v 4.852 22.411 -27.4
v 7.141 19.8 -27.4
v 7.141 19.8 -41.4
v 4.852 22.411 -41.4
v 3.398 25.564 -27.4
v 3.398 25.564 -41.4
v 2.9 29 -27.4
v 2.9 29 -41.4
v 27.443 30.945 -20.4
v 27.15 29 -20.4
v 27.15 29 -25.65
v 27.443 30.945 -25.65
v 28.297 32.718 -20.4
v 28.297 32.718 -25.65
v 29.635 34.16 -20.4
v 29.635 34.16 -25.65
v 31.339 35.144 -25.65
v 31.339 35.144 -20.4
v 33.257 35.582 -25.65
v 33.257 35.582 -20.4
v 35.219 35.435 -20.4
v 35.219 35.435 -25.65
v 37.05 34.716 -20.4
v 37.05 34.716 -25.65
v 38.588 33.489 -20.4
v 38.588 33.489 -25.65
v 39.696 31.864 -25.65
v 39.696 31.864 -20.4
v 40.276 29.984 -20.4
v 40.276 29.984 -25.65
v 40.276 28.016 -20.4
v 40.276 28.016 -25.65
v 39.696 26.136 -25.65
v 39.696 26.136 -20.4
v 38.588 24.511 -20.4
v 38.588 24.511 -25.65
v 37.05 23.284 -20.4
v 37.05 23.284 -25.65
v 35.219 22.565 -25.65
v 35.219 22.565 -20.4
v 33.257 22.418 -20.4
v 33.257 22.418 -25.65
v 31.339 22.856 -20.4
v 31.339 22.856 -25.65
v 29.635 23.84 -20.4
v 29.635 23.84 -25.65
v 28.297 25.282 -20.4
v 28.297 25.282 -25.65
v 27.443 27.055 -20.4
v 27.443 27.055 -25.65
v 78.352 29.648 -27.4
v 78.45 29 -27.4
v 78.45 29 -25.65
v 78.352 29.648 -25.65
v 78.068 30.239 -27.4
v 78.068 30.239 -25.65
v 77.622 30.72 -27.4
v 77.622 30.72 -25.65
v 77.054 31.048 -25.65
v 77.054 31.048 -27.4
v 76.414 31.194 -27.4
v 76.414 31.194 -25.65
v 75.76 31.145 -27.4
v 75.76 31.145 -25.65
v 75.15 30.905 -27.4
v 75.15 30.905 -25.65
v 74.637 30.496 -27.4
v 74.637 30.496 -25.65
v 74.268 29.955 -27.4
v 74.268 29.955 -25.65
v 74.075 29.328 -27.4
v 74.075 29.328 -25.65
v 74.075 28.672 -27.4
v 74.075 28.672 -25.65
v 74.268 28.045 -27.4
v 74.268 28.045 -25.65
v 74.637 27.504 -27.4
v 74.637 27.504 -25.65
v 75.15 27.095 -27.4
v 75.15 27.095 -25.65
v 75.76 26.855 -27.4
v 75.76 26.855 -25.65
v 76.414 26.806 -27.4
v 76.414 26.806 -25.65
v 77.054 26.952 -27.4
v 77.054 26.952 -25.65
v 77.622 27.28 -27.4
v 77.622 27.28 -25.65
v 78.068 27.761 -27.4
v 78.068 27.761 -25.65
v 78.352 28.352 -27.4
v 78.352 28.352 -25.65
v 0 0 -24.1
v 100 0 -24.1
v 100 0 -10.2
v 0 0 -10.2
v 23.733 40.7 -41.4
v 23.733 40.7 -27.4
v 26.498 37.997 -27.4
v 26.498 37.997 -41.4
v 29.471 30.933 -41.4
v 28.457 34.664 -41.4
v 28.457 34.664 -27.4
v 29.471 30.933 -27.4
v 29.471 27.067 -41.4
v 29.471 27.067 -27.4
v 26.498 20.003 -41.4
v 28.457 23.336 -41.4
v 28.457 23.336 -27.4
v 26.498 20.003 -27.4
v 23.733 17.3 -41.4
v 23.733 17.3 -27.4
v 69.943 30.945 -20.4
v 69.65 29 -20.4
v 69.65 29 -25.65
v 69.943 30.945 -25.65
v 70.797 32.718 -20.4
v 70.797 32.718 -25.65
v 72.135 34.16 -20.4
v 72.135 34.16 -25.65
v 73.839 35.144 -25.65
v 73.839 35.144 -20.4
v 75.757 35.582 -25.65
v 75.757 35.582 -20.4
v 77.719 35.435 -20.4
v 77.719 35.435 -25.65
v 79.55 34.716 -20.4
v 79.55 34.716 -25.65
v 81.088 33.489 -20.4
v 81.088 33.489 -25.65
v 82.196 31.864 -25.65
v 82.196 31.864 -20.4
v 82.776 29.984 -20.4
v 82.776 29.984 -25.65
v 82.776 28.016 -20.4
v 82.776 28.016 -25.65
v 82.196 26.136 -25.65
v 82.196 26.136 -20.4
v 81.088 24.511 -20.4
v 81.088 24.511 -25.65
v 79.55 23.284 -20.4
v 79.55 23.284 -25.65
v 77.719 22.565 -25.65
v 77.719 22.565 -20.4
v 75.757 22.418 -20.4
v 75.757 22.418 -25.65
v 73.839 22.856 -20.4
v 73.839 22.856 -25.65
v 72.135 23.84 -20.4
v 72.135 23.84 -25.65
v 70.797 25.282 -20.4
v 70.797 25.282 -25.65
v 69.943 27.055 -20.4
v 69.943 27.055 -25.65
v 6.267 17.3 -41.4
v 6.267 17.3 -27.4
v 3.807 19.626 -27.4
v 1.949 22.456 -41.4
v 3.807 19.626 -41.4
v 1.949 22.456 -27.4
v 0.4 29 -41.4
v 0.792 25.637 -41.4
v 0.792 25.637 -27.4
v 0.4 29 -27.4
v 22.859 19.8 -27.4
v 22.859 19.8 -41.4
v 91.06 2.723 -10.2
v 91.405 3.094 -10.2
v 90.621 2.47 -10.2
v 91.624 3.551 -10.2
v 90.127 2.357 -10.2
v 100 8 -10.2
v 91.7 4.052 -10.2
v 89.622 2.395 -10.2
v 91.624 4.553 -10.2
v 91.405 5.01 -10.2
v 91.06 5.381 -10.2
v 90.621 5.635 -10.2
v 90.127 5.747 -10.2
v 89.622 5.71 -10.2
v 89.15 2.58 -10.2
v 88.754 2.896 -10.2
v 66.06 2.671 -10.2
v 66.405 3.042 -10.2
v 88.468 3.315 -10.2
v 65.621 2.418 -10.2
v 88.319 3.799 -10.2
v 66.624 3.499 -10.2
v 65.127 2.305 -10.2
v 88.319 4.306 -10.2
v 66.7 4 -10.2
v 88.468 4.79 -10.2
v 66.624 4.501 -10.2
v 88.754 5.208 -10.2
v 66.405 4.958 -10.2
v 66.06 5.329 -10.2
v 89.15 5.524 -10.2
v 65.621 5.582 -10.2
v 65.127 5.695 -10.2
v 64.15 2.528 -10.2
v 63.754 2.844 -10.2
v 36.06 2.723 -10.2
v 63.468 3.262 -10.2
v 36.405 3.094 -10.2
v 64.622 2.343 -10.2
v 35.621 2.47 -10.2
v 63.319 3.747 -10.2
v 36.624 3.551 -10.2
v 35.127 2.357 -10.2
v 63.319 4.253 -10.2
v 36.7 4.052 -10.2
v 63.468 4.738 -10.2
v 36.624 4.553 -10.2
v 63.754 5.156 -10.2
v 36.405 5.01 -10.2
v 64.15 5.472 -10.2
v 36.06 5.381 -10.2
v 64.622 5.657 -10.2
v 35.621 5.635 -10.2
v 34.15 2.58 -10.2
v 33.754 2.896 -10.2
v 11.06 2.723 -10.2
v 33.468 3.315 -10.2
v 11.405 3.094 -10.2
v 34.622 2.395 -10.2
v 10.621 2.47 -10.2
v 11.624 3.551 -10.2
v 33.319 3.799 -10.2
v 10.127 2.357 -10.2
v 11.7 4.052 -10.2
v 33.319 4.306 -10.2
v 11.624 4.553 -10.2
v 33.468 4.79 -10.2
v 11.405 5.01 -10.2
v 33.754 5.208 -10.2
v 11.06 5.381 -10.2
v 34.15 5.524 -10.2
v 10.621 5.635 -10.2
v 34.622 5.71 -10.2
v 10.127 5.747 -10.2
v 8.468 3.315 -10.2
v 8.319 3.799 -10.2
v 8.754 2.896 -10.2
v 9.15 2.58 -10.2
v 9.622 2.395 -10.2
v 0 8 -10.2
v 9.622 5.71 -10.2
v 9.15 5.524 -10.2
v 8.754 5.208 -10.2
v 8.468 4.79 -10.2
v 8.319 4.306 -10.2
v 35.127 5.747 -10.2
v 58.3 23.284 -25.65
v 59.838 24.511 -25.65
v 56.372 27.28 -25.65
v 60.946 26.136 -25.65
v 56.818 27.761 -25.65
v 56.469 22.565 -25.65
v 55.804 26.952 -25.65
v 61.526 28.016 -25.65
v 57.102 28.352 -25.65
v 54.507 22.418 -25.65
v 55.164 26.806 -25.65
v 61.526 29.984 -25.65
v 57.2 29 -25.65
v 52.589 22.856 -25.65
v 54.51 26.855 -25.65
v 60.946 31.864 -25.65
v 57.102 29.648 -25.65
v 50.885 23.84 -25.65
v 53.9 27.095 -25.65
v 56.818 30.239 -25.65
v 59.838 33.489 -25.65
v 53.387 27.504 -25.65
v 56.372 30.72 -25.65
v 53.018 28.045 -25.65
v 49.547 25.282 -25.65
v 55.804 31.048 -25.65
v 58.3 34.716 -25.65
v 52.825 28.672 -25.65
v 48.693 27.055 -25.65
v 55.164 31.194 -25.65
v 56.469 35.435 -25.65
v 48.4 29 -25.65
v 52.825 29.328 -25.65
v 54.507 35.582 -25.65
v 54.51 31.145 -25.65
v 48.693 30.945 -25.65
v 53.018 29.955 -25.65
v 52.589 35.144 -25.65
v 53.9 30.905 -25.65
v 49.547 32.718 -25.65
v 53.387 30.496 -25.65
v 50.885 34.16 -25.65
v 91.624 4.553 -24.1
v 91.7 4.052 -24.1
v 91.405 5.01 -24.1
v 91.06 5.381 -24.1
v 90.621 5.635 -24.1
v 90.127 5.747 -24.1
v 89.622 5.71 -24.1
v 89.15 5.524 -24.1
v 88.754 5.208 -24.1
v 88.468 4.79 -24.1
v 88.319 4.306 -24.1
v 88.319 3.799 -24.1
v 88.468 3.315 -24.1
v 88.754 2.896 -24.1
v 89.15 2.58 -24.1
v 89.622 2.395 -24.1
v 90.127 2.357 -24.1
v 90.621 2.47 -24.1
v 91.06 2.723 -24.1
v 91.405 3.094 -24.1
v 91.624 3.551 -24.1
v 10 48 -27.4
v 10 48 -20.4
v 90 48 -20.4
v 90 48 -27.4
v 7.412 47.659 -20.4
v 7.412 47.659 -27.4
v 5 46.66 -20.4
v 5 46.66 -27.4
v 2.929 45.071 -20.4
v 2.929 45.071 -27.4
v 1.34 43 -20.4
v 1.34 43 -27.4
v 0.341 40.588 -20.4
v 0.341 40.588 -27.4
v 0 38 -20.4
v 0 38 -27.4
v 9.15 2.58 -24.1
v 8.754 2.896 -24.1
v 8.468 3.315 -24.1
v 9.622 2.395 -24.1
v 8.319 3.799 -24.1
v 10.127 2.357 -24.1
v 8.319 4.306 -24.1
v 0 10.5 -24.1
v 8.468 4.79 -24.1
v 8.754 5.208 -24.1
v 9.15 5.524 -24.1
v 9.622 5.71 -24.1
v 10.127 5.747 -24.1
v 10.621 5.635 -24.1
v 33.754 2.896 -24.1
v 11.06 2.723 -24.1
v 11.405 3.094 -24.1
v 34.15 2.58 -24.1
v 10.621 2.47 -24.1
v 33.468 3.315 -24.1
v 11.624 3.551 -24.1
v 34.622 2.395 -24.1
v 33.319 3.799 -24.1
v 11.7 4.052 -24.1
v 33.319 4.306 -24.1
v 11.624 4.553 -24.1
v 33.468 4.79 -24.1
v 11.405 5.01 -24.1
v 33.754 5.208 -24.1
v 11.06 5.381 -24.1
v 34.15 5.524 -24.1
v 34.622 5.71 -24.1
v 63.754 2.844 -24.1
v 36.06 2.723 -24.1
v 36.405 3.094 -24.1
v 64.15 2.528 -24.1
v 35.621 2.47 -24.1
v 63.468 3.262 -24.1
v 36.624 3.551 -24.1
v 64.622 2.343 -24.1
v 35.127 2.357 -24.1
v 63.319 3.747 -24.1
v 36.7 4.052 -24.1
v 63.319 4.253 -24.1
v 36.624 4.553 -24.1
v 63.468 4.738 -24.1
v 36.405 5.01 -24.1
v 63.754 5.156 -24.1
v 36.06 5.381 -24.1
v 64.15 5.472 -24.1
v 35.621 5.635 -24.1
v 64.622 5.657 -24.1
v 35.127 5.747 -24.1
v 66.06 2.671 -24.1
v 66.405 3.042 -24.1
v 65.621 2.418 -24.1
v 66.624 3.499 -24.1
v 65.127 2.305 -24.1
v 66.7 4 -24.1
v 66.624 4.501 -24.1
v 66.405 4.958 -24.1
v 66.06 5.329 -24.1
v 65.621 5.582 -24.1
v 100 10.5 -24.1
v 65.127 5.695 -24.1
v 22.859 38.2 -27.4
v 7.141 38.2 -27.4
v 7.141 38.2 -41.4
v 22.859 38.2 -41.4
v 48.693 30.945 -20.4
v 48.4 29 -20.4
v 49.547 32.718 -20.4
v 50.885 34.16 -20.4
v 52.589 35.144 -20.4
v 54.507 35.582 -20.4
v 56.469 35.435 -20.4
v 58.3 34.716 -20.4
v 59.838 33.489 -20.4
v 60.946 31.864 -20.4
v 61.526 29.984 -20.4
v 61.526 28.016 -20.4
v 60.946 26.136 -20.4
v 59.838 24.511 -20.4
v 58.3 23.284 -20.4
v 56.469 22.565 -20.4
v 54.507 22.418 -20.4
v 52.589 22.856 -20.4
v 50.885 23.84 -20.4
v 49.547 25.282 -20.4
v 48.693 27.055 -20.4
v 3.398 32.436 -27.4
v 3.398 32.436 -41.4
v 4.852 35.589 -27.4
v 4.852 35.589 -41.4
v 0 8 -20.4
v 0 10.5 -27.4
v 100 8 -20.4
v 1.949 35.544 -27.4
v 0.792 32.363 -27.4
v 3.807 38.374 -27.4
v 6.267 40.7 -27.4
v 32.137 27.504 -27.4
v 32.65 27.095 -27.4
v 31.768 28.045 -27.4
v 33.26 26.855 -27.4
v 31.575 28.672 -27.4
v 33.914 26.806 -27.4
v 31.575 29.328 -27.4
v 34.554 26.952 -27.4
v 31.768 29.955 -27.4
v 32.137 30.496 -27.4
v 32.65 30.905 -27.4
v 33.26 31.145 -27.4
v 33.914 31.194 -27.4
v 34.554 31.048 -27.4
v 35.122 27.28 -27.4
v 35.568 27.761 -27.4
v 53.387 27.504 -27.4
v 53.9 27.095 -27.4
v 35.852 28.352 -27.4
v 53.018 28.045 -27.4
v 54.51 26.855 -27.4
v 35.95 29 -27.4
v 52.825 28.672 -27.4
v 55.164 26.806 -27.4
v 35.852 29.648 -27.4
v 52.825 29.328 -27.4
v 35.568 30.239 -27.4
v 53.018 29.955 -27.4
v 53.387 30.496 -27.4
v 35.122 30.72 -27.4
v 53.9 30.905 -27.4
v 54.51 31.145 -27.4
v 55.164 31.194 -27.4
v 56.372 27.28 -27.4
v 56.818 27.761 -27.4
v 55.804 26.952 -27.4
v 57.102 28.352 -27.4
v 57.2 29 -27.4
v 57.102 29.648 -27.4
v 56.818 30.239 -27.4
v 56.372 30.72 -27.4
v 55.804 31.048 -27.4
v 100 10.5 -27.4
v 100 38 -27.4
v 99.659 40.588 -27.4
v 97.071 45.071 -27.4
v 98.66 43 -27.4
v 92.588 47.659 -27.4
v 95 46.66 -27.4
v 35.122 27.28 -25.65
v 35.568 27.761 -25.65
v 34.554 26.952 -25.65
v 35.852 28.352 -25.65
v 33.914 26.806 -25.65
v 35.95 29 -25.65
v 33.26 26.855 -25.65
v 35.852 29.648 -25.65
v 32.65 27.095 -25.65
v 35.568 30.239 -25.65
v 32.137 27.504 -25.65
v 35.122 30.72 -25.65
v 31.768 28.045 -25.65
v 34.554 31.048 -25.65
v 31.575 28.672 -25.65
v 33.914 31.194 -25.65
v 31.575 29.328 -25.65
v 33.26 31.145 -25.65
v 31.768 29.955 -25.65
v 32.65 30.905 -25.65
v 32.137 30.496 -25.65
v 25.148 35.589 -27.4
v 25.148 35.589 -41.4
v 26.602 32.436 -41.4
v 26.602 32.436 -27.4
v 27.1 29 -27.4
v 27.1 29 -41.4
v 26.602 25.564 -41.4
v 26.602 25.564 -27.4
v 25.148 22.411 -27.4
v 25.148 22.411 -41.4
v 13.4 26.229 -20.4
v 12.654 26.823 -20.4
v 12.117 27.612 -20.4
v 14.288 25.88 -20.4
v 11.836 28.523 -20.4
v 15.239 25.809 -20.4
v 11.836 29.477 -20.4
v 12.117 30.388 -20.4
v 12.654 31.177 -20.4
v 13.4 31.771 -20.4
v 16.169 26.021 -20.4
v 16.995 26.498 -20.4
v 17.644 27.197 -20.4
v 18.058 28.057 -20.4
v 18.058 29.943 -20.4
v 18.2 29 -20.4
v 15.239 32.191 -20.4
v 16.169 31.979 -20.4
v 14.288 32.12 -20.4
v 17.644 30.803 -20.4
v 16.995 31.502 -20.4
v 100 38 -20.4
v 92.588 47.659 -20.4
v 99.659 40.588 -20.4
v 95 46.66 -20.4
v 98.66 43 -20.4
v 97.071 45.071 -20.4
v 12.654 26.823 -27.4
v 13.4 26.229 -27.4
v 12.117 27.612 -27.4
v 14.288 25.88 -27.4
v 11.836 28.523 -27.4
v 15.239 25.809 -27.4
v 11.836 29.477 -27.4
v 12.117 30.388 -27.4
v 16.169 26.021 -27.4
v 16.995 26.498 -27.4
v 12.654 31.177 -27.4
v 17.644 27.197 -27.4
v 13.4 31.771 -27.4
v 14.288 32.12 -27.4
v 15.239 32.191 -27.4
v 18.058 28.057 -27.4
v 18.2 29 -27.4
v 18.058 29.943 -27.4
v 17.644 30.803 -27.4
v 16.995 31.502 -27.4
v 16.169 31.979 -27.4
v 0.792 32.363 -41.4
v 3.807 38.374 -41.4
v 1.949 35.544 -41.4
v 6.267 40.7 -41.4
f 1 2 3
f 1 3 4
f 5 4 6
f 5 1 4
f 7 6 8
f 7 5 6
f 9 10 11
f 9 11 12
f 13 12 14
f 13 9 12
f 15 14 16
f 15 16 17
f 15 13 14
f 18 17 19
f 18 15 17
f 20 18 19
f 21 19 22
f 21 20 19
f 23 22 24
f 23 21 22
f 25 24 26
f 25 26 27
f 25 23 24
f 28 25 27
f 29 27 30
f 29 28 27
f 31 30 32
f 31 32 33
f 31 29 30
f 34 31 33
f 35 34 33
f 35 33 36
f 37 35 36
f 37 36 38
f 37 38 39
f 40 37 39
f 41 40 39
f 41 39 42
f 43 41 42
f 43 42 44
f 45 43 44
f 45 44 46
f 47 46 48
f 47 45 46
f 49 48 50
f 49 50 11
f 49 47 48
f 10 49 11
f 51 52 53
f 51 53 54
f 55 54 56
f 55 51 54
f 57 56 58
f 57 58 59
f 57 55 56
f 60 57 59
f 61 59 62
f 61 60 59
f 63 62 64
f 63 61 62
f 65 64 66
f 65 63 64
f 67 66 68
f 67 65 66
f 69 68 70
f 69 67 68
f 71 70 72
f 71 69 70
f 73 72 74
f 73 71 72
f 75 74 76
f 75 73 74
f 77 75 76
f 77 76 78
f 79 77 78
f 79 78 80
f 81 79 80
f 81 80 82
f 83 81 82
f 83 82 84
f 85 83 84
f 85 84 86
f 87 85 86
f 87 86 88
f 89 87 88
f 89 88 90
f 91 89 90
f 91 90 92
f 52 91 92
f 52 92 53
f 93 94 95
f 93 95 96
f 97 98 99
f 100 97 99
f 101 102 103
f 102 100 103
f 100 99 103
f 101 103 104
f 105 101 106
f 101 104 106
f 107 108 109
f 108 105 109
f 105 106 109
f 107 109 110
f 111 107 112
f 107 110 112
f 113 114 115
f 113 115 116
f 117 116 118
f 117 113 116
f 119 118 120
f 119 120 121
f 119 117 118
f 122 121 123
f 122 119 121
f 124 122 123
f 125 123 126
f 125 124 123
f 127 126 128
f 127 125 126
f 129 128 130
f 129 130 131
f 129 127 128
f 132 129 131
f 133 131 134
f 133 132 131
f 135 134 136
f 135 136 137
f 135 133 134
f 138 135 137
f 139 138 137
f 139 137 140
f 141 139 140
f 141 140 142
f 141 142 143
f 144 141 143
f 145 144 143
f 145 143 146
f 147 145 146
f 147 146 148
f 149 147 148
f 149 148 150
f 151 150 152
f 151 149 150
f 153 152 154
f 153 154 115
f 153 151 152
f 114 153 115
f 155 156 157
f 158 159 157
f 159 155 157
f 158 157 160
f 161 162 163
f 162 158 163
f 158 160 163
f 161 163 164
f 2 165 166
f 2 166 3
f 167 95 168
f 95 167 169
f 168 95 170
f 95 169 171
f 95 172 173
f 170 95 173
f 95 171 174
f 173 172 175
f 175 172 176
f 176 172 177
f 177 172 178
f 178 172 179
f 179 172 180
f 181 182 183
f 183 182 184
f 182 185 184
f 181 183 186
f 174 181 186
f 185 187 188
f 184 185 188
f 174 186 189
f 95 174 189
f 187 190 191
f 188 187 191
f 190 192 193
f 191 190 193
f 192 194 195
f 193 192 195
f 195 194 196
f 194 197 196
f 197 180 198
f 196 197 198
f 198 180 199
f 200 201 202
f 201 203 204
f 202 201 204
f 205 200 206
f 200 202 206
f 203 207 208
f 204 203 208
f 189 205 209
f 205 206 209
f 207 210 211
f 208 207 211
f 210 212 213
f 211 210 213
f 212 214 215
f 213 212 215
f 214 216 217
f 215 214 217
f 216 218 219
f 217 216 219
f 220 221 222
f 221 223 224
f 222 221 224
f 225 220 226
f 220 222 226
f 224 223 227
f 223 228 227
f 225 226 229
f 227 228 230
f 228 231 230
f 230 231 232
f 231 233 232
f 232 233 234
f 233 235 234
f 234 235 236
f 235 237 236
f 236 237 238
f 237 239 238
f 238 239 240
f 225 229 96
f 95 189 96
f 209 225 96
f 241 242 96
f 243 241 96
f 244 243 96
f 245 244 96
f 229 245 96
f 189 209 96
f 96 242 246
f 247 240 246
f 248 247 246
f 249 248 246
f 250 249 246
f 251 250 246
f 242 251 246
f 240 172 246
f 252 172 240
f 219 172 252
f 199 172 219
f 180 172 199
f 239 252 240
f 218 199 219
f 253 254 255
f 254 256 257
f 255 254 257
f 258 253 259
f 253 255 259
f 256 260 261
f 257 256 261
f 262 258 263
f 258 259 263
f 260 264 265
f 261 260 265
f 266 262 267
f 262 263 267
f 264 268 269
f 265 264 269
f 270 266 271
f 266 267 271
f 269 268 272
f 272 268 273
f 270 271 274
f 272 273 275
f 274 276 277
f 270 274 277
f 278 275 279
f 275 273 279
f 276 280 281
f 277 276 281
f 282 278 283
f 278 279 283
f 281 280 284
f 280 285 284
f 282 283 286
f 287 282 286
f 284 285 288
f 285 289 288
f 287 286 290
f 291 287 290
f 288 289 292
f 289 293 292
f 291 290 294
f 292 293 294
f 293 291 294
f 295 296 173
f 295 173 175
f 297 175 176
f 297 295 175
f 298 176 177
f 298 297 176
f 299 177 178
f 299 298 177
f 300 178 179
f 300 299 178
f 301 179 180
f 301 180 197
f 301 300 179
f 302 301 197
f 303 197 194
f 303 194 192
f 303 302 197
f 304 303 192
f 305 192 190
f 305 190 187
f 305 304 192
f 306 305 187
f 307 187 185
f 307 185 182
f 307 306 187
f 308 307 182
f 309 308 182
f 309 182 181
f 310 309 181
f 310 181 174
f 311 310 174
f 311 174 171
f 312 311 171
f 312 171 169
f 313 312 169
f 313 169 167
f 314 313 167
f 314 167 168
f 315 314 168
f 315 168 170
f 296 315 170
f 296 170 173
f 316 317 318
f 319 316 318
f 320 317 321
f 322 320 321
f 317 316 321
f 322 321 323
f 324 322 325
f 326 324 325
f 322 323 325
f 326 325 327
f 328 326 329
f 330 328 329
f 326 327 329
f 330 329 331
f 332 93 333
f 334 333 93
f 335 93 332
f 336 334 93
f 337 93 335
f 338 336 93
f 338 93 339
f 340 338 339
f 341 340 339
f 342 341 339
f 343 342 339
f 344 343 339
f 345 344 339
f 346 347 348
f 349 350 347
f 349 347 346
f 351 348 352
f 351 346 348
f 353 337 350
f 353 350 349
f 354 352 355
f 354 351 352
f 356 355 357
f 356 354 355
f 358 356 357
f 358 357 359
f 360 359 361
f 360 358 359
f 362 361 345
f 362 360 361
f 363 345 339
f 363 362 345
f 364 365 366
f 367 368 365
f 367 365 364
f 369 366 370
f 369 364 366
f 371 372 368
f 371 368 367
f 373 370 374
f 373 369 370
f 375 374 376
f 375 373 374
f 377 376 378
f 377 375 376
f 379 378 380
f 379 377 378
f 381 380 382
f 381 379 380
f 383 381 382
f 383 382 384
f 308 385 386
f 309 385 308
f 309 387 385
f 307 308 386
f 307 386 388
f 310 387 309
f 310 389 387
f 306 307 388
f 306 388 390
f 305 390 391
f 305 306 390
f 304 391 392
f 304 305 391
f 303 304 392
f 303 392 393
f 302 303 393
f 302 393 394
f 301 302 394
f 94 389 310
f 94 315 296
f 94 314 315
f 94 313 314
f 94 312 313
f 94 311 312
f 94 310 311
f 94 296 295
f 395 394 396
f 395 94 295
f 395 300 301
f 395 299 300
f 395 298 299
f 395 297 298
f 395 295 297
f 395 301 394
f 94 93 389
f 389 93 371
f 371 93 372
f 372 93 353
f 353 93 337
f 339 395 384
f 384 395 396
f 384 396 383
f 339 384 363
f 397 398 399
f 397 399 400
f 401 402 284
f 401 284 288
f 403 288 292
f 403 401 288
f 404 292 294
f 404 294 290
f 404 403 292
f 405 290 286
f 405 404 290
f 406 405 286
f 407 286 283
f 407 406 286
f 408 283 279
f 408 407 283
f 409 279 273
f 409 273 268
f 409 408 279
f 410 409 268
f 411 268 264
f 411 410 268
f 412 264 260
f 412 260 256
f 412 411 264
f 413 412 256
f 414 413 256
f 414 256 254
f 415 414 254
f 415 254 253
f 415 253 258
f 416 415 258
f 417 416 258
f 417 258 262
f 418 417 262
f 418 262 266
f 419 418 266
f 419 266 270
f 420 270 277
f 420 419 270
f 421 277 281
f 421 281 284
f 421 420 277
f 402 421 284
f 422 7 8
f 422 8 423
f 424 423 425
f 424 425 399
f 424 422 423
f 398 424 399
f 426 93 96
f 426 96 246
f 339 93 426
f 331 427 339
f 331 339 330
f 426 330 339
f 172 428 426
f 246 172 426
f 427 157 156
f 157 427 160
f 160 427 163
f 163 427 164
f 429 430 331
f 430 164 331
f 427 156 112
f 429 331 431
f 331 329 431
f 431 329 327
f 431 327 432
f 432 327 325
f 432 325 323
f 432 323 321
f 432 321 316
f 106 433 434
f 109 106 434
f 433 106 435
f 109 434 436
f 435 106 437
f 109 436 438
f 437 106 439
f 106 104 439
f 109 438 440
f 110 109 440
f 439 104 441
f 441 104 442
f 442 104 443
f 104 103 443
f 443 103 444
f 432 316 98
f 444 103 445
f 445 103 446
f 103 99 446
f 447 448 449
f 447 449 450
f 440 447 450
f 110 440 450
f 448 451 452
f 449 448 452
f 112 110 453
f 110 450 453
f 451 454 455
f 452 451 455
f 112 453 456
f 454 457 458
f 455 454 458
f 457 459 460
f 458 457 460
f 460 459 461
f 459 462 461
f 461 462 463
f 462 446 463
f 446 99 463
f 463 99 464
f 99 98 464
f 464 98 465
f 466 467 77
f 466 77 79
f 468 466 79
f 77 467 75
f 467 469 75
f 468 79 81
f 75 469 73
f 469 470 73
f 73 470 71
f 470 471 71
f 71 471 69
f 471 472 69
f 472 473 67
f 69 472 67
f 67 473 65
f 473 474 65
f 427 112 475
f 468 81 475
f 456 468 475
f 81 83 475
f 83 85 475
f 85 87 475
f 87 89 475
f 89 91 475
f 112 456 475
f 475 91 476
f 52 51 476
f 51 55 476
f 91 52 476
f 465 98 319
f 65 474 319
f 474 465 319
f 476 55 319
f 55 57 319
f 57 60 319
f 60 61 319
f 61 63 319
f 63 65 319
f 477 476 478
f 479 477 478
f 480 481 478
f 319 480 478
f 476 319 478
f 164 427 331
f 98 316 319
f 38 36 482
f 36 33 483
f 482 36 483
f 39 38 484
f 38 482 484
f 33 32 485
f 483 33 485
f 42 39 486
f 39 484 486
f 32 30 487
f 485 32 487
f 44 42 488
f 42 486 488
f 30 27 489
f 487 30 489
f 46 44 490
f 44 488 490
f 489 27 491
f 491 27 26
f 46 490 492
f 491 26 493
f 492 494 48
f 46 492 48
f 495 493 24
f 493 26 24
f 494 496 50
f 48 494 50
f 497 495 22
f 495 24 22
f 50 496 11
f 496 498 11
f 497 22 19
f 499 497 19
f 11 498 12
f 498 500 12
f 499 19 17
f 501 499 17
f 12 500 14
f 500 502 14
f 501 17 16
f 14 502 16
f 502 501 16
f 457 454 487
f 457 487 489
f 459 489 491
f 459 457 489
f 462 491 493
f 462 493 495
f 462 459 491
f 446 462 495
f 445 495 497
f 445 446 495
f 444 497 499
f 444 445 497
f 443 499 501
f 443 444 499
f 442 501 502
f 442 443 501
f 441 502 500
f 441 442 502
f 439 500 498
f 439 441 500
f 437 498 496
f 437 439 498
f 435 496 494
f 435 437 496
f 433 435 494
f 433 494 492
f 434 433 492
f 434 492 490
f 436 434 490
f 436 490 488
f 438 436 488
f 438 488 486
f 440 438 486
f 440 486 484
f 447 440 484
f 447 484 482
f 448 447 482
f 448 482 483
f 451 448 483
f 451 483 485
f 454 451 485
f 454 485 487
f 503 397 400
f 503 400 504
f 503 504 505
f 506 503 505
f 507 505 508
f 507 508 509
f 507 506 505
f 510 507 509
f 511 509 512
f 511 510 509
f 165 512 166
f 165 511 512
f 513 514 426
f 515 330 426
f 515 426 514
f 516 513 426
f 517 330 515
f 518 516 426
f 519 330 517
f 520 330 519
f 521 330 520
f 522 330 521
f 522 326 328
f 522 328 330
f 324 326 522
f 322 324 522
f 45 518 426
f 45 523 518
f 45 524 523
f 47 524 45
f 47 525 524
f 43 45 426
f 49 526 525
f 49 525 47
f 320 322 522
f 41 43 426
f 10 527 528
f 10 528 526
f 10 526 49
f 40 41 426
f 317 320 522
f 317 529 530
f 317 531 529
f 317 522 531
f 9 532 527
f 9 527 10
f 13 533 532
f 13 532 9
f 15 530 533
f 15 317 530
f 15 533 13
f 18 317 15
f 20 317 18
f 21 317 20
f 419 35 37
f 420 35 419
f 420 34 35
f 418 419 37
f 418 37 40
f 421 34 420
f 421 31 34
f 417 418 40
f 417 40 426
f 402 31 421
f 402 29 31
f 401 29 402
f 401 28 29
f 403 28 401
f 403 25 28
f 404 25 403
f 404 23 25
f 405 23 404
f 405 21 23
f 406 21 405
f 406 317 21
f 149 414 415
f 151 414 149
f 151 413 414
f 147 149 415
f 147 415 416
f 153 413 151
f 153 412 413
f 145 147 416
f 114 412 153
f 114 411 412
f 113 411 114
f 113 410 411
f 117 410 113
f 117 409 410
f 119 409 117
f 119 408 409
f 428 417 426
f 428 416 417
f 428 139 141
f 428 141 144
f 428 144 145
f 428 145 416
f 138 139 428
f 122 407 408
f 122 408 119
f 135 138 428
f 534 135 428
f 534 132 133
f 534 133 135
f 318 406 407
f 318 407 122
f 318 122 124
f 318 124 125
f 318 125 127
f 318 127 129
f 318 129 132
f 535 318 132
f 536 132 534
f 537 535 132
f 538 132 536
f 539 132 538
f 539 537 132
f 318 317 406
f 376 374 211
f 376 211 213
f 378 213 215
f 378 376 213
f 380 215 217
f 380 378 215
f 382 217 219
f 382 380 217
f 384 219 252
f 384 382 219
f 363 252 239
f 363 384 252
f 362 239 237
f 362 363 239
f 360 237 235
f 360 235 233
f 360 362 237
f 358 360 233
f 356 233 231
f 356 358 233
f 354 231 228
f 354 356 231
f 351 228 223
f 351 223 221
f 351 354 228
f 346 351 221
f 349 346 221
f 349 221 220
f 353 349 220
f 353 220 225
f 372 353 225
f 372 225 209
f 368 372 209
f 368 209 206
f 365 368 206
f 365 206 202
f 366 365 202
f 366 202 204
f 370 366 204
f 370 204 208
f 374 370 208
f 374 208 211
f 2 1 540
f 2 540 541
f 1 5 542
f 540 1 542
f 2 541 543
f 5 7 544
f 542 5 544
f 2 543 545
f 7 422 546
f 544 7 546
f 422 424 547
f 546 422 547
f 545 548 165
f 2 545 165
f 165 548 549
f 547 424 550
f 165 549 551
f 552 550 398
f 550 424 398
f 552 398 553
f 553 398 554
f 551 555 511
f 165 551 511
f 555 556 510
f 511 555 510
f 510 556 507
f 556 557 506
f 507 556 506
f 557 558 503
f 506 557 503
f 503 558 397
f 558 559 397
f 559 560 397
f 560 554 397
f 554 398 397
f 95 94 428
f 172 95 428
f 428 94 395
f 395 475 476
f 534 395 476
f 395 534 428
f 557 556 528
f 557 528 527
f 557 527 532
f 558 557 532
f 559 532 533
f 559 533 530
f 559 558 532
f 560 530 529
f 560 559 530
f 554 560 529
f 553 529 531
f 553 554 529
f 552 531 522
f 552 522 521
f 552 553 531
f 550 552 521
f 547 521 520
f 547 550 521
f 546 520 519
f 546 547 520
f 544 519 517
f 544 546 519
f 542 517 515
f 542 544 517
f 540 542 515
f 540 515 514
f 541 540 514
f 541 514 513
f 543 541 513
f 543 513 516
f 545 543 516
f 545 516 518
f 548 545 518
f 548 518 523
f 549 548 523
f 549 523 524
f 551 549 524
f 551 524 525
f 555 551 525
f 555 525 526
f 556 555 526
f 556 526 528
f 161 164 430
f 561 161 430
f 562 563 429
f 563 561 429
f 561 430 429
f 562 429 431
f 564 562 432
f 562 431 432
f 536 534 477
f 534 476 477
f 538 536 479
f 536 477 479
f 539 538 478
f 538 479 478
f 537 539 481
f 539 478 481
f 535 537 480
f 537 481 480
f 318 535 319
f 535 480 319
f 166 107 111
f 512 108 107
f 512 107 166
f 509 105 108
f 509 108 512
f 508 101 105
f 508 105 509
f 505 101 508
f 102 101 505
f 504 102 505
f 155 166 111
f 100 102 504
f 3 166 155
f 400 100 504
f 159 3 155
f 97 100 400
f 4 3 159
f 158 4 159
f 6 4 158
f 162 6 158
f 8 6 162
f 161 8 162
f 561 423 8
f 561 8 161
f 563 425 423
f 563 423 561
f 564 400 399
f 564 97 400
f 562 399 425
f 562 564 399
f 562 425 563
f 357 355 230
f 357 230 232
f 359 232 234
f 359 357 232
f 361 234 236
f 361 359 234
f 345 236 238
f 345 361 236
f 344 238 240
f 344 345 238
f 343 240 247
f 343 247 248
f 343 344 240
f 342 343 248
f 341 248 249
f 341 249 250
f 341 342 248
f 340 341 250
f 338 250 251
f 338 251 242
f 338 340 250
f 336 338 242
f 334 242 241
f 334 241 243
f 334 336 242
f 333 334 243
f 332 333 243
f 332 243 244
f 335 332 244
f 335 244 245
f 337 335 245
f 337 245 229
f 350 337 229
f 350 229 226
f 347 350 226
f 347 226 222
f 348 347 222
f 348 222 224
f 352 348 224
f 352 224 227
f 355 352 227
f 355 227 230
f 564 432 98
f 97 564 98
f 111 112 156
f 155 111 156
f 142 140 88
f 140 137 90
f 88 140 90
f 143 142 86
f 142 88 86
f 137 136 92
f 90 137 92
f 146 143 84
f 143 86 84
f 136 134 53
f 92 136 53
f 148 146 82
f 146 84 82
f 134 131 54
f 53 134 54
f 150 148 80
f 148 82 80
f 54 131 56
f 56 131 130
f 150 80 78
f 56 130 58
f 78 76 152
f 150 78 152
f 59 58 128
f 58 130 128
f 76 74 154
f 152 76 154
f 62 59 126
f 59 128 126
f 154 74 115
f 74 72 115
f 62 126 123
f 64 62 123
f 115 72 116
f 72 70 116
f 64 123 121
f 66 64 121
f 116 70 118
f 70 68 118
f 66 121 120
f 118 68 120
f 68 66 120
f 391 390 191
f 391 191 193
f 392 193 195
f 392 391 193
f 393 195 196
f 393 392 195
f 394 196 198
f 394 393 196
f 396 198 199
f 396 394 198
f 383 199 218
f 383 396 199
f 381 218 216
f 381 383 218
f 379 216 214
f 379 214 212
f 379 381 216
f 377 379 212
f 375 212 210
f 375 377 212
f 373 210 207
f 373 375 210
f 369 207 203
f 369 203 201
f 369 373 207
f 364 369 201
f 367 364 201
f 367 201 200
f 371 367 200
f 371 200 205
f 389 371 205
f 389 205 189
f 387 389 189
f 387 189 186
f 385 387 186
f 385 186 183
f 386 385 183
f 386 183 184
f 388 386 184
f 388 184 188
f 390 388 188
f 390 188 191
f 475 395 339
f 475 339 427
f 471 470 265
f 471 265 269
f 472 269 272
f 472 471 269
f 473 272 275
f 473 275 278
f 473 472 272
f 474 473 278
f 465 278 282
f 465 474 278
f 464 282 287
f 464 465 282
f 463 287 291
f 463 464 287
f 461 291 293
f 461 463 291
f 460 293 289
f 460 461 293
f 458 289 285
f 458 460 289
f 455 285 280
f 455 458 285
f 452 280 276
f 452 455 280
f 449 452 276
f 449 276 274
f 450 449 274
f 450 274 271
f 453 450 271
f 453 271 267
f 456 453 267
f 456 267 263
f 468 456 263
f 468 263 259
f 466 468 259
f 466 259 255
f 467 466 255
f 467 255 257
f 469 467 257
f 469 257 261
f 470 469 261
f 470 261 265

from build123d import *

# Parameters (mm, degrees)
SKETCH1_W           = 100
SKETCH1_H           = 48
BOSS_EXTRUDE1_DEPTH = 7
CUT_EXTRUDE1_REACH  = 113.144
SKETCH2_R           = 3.2
SKETCH2_R_2         = 2.2
SKETCH3_W           = 100
SKETCH3_H           = 8
BOSS_EXTRUDE2_DEPTH = 10.2
SKETCH4_R           = 6.6
CUT_EXTRUDE2_DEPTH  = 5.25
SKETCH5_R           = 2.6
CUT_EXTRUDE3_DEPTH  = 0.1
SKETCH7_R           = 1.7
CUT_EXTRUDE4_DEPTH  = 113.233729333
CUT_EXTRUDE5_REACH  = 114.249
SKETCH8_R           = 1.7
CUT_EXTRUDE6_REACH  = 116.257
SKETCH9_W           = 3.3
SKETCH9_H           = 10.5
BOSS_EXTRUDE3_DEPTH = 14
SHELL1_T            = 2.5
FILLET3_R           = 10


with BuildPart() as part:
    # Sketch1 → Boss-Extrude1 (new body)
    with BuildSketch(Plane.XY):
        with Locations((50, 24)):
            Rectangle(SKETCH1_W, SKETCH1_H)
    extrude(amount=BOSS_EXTRUDE1_DEPTH)

    # Sketch2 → Cut-Extrude1 (cut, up to next)
    with BuildSketch(Plane.XY.offset(7), mode=Mode.PRIVATE) as cut_extrude1_sk1:
        with Locations((15, 29)):
            Circle(SKETCH2_R)
    cut_extrude1_tool1 = extrude(cut_extrude1_sk1.sketch, amount=-CUT_EXTRUDE1_REACH, mode=Mode.PRIVATE) & part.part
    # Sketch2 → Cut-Extrude1 (cut, up to next)
    with BuildSketch(Plane.XY.offset(7), mode=Mode.PRIVATE) as cut_extrude1_sk2:
        with Locations((33.75, 29)):
            Circle(SKETCH2_R_2)
    cut_extrude1_tool2 = extrude(cut_extrude1_sk2.sketch, amount=-CUT_EXTRUDE1_REACH, mode=Mode.PRIVATE) & part.part
    # Sketch2 → Cut-Extrude1 (cut, up to next)
    with BuildSketch(Plane.XY.offset(7), mode=Mode.PRIVATE) as cut_extrude1_sk3:
        with Locations((55, 29)):
            Circle(SKETCH2_R_2)
    cut_extrude1_tool3 = extrude(cut_extrude1_sk3.sketch, amount=-CUT_EXTRUDE1_REACH, mode=Mode.PRIVATE) & part.part
    # Sketch2 → Cut-Extrude1 (cut, up to next)
    with BuildSketch(Plane.XY.offset(7), mode=Mode.PRIVATE) as cut_extrude1_sk4:
        with Locations((76.25, 29)):
            Circle(SKETCH2_R_2)
    cut_extrude1_tool4 = extrude(cut_extrude1_sk4.sketch, amount=-CUT_EXTRUDE1_REACH, mode=Mode.PRIVATE) & part.part
    add(cut_extrude1_tool1.solids().sort_by_distance((15, 29, 7))[0], mode=Mode.SUBTRACT)
    add(cut_extrude1_tool2.solids().sort_by_distance((33.75, 29, 7))[0], mode=Mode.SUBTRACT)
    add(cut_extrude1_tool3.solids().sort_by_distance((55, 29, 7))[0], mode=Mode.SUBTRACT)
    add(cut_extrude1_tool4.solids().sort_by_distance((76.25, 29, 7))[0], mode=Mode.SUBTRACT)

    # Sketch3 → Boss-Extrude2 (add)
    with BuildSketch(Plane(origin=(0, 0, 0), x_dir=(-1, 0, 0), z_dir=(0, 0, -1))):
        with Locations((-50, 4)):
            Rectangle(SKETCH3_W, SKETCH3_H)
    extrude(amount=BOSS_EXTRUDE2_DEPTH)

    # Sketch4 → Cut-Extrude2 (cut)
    with BuildSketch(Plane(origin=(0, 0, 0), x_dir=(-1, 0, 0), z_dir=(0, 0, -1))):
        with Locations((-76.25, 29)):
            Circle(SKETCH4_R)
        with Locations((-55, 29)):
            Circle(SKETCH4_R)
        with Locations((-33.75, 29)):
            Circle(SKETCH4_R)
    extrude(amount=-CUT_EXTRUDE2_DEPTH, mode=Mode.SUBTRACT)

    # Sketch5 → Cut-Extrude3 (cut)
    with BuildSketch(Plane.XY.offset(7)):
        with Locations((35.000022648, 4.052132501)):
            Circle(SKETCH5_R)
        with Locations((64.999977352, 4)):
            Circle(SKETCH5_R)
    extrude(amount=-CUT_EXTRUDE3_DEPTH, mode=Mode.SUBTRACT)

    # Sketch7 → Cut-Extrude4 (cut, through all)
    with BuildSketch(Plane.XY.offset(6.9)):
        with Locations((35.000022648, 4.052132501)):
            Circle(SKETCH7_R)
        with Locations((64.999977352, 4)):
            Circle(SKETCH7_R)
    extrude(amount=-CUT_EXTRUDE4_DEPTH, mode=Mode.SUBTRACT)

    # Sketch8 → Cut-Extrude5 (cut, up to next)
    with BuildSketch(Plane.XY.offset(7), mode=Mode.PRIVATE) as cut_extrude5_sk1:
        with Locations((10, 4.052132501)):
            Circle(SKETCH8_R)
    cut_extrude5_tool1 = extrude(cut_extrude5_sk1.sketch, amount=-CUT_EXTRUDE5_REACH, mode=Mode.PRIVATE) & part.part
    # Sketch8 → Cut-Extrude5 (cut, up to next)
    with BuildSketch(Plane.XY.offset(7), mode=Mode.PRIVATE) as cut_extrude5_sk2:
        with Locations((90, 4.052132501)):
            Circle(SKETCH8_R)
    cut_extrude5_tool2 = extrude(cut_extrude5_sk2.sketch, amount=-CUT_EXTRUDE5_REACH, mode=Mode.PRIVATE) & part.part
    add(cut_extrude5_tool1.solids().sort_by_distance((10, 4.052133, 7))[0], mode=Mode.SUBTRACT)
    add(cut_extrude5_tool2.solids().sort_by_distance((90, 4.052133, 7))[0], mode=Mode.SUBTRACT)


with BuildPart() as body_2:
    # Mirror1: mirrored copy
    add(part.part.mirror(Plane.XY.offset(-10.2)))

    # Sketch9 → Cut-Extrude6 (cut, up to next)
    with BuildSketch(Plane(origin=(100, 0, 0), x_dir=(0, 0, -1), z_dir=(1, 0, 0)), mode=Mode.PRIVATE) as cut_extrude6_sk1:
        with Locations((25.75, 5.25)):
            Rectangle(SKETCH9_W, SKETCH9_H)
    cut_extrude6_tool1 = extrude(cut_extrude6_sk1.sketch, amount=-CUT_EXTRUDE6_REACH, mode=Mode.PRIVATE) & body_2.part
    add(cut_extrude6_tool1.solids().sort_by_distance((100, 5.25, -25.75))[0], mode=Mode.SUBTRACT)


with BuildPart() as body_2_2:
    # Sketch10 → Boss-Extrude3 (new body)
    with BuildSketch(Plane(origin=(0, 0, -27.4), x_dir=(-1, 0, 0), z_dir=(0, 0, -1))):
        with BuildLine():
            Line((-7.140610711, 38.2), (-22.859389289, 38.2))
            ThreePointArc((-22.859389289, 38.2), (-27.1, 29), (-22.859389289, 19.8))
            Line((-22.859389289, 19.8), (-7.140610711, 19.8))
            ThreePointArc((-7.140610711, 19.8), (-2.9, 29), (-7.140610711, 38.2))
        make_face()
    extrude(amount=BOSS_EXTRUDE3_DEPTH)

    # Shell1
    shell1_openings = [body_2_2.faces().sort_by_distance(p)[0] for p in [
        (15, 29, -27.4),
        (15, 29, -41.4),
    ]]
    offset(amount=SHELL1_T, openings=shell1_openings, kind=Kind.INTERSECTION)


with BuildPart() as body_2_1:
    add(body_2.part)

    # Combine1: union body 2 2
    add(body_2_2.part)

    # Fillet3
    fillet3_edges = [body_2_1.edges().sort_by_distance(p)[0] for p in [
        (0, 48, -23.9),
        (100, 48, -23.9),
    ]]
    fillet(fillet3_edges, radius=FILLET3_R)


solid = body_2_1.part
